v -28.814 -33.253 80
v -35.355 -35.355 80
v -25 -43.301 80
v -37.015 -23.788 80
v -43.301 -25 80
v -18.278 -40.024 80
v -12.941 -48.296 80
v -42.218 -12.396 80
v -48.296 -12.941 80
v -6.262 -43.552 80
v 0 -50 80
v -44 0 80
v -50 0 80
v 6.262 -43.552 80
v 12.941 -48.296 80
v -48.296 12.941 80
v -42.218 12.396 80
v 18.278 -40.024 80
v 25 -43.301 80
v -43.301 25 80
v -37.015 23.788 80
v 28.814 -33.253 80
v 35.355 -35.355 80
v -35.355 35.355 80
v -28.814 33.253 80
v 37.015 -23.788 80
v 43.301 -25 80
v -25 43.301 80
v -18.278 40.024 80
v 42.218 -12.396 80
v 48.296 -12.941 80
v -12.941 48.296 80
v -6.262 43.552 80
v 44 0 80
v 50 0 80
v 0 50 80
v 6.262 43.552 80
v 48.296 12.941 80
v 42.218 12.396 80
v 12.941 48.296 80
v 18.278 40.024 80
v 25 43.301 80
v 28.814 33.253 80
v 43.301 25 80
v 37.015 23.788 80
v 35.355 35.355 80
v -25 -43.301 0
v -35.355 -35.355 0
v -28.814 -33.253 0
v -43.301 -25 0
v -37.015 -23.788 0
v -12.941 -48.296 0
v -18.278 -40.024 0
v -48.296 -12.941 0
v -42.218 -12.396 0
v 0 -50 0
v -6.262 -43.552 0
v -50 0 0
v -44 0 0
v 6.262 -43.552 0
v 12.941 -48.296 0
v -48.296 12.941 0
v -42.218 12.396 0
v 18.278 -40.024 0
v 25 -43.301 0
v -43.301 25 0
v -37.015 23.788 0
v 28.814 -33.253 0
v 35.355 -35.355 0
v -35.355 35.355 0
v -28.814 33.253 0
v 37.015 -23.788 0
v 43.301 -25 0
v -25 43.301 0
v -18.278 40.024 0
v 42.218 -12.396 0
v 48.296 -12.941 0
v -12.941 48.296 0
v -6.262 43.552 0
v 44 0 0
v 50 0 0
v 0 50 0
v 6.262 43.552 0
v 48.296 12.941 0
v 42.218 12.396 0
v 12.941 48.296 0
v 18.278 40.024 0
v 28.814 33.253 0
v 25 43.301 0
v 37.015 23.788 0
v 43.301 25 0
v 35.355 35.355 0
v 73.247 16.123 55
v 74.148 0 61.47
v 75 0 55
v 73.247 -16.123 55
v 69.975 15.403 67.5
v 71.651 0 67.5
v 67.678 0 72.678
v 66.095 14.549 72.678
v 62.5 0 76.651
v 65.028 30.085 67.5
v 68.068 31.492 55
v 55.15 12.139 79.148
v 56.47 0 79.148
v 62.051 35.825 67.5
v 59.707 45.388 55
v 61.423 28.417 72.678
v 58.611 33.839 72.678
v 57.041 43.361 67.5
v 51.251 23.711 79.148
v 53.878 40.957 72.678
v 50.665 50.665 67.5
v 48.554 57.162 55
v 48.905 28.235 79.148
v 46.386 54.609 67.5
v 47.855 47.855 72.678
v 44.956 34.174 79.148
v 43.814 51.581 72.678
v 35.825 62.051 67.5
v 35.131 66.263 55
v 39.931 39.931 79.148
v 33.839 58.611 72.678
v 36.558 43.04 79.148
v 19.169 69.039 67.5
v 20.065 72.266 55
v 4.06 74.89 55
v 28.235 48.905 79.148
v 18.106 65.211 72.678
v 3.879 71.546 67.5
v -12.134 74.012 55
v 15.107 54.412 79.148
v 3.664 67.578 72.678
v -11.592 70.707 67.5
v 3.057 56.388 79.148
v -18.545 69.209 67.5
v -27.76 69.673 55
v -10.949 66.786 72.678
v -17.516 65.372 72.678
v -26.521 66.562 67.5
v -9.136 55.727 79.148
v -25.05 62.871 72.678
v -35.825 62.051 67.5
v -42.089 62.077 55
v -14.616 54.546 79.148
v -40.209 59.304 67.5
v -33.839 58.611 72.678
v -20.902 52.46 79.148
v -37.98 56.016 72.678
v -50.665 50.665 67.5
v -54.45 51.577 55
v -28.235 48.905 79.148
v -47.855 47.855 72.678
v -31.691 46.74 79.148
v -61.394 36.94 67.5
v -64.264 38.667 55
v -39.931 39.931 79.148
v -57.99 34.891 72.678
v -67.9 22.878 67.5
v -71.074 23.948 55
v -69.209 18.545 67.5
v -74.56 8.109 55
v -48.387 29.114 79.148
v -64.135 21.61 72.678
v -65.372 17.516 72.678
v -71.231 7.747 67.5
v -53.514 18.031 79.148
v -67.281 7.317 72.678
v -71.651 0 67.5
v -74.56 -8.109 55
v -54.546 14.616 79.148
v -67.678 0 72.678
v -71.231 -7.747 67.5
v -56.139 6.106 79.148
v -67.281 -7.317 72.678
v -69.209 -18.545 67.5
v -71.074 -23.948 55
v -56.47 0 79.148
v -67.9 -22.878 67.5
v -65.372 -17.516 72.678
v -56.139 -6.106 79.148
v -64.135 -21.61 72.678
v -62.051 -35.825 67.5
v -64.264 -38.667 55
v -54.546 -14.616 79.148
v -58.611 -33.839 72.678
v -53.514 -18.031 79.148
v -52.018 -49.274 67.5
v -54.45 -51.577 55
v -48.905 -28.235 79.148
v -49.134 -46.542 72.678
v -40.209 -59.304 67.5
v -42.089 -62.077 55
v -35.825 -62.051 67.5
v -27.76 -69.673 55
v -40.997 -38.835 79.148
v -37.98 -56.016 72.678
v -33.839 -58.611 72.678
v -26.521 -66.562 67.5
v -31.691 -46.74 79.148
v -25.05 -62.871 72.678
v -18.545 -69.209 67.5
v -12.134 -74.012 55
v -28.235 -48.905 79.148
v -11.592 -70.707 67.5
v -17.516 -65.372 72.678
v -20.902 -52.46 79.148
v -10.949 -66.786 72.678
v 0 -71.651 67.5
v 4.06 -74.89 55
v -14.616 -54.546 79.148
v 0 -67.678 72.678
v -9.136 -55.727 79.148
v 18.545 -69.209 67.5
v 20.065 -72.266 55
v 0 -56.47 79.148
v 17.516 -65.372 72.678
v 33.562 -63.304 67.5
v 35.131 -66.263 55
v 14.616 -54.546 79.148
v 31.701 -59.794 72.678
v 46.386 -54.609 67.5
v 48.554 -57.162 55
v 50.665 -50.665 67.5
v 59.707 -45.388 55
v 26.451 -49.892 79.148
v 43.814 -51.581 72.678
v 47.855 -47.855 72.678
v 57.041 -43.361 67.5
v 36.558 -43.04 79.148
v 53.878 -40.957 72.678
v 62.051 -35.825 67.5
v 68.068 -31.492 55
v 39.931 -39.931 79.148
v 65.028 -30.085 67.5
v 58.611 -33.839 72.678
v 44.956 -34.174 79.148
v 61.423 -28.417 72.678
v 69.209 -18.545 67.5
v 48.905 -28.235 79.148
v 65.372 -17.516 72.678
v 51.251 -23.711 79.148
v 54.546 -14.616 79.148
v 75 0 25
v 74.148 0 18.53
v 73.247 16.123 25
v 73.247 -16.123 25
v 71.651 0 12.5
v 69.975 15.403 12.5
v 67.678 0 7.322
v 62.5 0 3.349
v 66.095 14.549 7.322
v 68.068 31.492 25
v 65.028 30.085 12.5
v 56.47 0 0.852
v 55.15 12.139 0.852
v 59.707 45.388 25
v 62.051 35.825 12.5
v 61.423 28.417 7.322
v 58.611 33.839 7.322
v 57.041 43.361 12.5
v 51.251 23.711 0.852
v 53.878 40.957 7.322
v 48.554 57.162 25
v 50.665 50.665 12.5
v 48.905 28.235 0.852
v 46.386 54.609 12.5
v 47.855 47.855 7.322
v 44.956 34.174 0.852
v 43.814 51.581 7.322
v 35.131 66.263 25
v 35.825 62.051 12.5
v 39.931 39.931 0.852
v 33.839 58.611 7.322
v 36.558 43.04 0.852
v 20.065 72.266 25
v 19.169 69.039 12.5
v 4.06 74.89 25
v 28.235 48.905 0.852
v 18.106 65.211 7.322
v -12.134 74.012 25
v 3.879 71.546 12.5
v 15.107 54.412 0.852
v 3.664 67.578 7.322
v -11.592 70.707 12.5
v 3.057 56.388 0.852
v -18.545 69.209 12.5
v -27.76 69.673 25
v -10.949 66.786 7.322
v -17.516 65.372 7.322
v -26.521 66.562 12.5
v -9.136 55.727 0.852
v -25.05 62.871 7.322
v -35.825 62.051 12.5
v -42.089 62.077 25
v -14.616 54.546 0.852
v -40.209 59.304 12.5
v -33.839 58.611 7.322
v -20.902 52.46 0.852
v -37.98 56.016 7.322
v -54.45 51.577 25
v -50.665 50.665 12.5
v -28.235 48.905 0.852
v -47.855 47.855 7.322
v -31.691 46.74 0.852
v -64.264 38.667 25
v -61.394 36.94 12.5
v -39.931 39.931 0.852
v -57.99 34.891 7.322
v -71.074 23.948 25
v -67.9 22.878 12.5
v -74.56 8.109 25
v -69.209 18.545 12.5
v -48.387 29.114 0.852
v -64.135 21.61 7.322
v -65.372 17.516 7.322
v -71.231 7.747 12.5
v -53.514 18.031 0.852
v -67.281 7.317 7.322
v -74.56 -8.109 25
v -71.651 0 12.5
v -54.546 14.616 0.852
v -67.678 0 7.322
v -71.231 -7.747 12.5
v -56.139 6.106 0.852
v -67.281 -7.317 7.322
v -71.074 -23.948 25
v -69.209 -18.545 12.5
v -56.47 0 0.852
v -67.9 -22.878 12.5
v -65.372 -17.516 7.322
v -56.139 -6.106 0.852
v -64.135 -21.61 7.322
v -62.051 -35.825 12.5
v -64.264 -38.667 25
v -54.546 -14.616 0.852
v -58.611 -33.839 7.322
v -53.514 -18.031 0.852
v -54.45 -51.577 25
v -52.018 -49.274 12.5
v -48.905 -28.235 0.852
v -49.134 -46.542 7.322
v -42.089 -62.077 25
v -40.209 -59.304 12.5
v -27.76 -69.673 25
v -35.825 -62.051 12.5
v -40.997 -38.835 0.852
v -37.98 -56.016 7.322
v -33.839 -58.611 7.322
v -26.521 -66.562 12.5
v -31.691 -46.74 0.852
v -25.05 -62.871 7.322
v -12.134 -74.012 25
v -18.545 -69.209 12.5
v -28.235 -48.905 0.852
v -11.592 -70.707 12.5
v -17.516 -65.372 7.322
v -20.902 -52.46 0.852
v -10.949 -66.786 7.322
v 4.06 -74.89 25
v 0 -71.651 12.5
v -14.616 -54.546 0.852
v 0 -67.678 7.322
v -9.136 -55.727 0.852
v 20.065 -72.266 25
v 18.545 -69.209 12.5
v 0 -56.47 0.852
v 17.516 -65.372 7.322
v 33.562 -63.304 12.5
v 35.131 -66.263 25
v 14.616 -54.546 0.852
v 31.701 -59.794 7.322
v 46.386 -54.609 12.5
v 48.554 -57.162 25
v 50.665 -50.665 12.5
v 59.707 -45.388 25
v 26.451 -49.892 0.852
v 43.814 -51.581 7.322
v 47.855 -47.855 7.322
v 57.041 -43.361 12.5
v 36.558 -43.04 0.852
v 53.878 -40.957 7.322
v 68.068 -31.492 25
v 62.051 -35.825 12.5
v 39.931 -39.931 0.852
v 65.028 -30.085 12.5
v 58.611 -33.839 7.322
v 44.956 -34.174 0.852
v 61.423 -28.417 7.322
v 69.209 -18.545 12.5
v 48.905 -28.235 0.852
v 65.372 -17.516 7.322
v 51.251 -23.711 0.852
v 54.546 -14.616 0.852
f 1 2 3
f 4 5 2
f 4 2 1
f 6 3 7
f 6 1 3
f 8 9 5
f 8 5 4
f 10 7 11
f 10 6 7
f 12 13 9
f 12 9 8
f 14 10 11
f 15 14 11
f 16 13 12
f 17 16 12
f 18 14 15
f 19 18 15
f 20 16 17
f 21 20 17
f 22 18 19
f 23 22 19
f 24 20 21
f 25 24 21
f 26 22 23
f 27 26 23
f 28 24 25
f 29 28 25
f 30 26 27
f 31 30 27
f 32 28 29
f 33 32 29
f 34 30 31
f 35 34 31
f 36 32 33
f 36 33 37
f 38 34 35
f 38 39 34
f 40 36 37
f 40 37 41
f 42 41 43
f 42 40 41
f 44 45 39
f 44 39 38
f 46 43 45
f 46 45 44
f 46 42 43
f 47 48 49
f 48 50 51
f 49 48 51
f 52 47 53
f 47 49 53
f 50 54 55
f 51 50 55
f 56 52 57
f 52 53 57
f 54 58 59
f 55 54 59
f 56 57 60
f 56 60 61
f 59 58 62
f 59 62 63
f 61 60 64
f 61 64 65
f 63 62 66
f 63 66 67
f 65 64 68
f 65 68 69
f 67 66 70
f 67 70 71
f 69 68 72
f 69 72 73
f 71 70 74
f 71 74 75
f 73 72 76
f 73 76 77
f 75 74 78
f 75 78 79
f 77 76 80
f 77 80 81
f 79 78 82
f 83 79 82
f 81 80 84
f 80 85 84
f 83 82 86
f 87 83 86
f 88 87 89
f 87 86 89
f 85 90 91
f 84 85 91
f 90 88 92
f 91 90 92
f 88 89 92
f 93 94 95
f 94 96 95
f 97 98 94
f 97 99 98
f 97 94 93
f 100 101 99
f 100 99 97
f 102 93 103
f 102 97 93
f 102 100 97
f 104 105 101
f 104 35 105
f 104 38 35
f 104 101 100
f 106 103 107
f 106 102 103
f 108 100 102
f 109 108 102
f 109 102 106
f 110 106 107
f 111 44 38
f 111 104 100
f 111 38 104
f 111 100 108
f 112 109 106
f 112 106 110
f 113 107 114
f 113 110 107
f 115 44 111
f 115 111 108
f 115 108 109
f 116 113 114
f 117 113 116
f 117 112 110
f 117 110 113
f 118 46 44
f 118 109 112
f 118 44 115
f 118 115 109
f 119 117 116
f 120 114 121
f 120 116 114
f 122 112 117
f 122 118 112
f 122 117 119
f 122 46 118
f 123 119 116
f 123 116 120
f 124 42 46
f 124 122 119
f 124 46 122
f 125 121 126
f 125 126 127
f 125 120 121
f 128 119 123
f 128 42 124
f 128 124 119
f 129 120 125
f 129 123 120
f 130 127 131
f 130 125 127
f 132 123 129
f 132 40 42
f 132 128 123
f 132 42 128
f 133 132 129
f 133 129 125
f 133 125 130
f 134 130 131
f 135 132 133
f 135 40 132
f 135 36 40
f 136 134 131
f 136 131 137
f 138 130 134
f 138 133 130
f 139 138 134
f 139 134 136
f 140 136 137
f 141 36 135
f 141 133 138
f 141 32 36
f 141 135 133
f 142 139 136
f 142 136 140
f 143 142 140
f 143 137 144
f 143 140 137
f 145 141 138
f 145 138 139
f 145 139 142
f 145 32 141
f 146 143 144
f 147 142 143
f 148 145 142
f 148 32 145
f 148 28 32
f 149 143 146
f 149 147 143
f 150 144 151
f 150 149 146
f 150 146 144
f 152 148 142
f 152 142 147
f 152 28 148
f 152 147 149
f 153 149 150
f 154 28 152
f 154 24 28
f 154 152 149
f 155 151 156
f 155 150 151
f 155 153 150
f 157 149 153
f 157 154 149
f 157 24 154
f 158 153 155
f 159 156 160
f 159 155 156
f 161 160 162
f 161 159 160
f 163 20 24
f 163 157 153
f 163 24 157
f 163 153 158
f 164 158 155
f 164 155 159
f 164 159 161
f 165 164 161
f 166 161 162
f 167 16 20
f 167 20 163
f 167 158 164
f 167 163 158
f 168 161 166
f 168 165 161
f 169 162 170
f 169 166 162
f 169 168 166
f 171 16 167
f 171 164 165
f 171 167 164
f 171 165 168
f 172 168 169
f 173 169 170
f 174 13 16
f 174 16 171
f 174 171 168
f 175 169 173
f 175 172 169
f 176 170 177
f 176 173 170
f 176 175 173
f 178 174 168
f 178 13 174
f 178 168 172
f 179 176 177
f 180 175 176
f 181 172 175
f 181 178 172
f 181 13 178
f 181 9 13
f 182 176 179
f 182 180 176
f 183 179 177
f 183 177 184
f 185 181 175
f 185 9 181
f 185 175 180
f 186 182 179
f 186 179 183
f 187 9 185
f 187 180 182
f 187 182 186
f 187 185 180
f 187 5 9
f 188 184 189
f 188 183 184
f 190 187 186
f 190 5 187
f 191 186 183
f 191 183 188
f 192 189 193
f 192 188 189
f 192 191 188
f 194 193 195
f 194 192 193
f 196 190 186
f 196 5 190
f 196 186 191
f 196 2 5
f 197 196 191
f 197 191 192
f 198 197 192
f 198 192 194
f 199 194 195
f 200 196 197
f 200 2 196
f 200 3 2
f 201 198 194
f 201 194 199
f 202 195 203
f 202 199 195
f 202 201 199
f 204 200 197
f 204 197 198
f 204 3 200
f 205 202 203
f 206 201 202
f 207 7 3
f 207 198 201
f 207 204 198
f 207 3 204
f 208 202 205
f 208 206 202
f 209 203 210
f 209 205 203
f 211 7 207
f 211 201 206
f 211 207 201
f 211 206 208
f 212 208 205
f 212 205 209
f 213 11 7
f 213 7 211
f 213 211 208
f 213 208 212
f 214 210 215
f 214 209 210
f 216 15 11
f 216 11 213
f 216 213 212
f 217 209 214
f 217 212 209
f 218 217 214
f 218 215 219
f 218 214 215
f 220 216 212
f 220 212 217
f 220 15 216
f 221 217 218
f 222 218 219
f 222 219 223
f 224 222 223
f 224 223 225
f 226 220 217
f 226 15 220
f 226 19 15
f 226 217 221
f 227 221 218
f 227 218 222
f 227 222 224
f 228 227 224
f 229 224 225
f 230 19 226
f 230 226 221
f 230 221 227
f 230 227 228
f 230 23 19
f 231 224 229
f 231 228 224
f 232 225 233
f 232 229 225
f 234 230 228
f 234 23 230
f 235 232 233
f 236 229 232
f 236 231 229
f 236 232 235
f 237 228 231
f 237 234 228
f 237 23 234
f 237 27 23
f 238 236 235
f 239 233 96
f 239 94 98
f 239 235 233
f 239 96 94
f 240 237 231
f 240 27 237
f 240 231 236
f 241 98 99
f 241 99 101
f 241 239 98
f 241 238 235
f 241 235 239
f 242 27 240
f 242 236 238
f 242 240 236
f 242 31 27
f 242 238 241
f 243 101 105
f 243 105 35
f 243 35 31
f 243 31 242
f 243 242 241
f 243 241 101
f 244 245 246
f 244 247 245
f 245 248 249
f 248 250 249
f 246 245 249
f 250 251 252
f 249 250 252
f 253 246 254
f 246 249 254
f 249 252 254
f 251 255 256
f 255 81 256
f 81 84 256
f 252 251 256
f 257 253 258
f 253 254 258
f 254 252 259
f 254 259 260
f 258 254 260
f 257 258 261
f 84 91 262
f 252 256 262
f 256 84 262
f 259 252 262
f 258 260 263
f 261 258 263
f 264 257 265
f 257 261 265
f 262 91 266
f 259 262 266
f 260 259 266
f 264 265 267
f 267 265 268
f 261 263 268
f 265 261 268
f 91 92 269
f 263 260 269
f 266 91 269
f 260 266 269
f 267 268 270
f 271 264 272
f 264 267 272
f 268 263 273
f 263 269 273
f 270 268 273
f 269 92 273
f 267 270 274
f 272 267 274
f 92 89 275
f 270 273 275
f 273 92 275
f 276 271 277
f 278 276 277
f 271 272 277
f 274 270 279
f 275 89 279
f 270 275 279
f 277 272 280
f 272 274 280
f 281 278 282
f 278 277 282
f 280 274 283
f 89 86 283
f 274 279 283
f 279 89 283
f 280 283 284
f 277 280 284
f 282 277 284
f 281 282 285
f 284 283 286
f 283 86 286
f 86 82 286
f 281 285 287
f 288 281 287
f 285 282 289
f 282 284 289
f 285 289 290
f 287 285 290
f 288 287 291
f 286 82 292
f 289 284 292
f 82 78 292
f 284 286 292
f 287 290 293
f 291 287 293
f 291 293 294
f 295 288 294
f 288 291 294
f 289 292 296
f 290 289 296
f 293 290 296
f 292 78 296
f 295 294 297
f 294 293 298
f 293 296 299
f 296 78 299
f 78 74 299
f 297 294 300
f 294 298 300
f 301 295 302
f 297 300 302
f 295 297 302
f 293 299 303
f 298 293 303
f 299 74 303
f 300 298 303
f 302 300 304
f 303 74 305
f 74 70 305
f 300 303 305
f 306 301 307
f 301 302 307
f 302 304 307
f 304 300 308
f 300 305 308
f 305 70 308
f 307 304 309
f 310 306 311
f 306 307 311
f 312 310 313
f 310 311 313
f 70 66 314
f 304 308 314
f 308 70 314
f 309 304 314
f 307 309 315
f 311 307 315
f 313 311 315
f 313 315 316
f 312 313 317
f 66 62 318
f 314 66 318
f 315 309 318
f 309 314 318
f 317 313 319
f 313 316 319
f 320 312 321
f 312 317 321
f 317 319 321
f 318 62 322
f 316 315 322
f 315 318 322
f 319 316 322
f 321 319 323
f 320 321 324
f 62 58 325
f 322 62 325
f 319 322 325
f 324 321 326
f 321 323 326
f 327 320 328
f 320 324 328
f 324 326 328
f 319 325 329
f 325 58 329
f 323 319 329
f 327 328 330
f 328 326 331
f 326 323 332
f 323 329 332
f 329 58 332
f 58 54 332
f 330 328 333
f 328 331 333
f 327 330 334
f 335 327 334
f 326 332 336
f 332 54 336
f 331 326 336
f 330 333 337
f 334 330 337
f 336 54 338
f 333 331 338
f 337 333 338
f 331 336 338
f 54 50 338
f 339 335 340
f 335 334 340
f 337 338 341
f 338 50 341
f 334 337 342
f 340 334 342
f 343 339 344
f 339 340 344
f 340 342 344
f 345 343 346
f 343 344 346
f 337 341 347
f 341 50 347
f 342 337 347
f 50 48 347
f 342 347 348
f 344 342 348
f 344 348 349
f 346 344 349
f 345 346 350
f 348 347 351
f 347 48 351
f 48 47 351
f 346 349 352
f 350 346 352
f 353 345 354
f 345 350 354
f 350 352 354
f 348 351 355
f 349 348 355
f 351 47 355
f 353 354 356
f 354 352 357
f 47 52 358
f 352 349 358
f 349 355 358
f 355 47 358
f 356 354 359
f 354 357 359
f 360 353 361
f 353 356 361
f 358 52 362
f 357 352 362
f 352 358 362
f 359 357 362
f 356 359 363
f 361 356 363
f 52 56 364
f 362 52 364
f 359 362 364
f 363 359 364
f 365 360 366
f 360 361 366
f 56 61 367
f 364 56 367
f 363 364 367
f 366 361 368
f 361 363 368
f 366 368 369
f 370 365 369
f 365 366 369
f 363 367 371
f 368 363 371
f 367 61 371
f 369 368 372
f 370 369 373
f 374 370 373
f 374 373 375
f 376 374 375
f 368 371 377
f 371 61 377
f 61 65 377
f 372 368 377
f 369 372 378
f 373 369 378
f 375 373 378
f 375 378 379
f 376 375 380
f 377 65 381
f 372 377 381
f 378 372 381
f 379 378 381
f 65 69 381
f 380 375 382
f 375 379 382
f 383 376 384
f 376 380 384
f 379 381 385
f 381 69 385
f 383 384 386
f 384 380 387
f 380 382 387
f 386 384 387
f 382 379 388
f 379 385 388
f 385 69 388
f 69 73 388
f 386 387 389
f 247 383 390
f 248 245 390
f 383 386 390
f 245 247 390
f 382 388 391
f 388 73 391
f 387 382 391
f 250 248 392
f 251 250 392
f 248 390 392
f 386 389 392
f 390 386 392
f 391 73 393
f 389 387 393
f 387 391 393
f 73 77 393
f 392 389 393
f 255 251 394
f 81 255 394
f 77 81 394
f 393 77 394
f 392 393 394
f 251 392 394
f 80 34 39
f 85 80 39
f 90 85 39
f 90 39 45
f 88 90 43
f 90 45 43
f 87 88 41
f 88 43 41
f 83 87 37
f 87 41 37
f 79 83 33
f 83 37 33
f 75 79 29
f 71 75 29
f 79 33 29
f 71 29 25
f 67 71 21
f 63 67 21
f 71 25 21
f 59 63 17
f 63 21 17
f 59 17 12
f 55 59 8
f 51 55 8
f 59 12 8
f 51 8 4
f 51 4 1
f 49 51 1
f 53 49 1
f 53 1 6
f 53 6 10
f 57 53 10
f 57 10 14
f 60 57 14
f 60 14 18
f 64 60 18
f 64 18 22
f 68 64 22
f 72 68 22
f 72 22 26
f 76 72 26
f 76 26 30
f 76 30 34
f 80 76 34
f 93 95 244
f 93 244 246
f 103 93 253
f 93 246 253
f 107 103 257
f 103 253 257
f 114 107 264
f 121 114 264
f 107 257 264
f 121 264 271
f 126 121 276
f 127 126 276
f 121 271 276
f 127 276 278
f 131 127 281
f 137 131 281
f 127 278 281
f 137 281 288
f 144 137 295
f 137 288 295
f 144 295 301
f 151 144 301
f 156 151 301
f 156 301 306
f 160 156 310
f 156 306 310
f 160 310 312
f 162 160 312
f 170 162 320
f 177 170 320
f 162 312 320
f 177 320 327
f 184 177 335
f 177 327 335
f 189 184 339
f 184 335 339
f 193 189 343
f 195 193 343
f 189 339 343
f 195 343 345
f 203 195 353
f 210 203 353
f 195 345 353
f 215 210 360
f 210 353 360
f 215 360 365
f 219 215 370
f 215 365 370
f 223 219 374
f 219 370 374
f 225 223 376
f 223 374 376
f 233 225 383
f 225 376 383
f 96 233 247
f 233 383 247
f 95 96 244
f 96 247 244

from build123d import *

# Parameters (mm, degrees)
F0_R     = 75
F1_DEPTH = 80
F2_R     = 25
F3_R     = 44
F4_DEPTH = 177.9


with BuildPart() as f1:
    # F0 (on Top) → F1 (new body)
    with BuildSketch(Plane.XY):
        Circle(F0_R)
    extrude(amount=F1_DEPTH)

    # F2
    f2_edges = [f1.edges().sort_by_distance(p)[0] for p in [
        (75, 0, 40),
        (-75, 0, 0),
        (-75, 0, 80),
    ]]
    fillet(f2_edges, radius=F2_R)

    # F3 (on face) → F4 (cut)
    with BuildSketch(Plane.XY.offset(80)):
        Circle(F3_R)
    extrude(amount=-F4_DEPTH, mode=Mode.SUBTRACT)


solid = f1.part
